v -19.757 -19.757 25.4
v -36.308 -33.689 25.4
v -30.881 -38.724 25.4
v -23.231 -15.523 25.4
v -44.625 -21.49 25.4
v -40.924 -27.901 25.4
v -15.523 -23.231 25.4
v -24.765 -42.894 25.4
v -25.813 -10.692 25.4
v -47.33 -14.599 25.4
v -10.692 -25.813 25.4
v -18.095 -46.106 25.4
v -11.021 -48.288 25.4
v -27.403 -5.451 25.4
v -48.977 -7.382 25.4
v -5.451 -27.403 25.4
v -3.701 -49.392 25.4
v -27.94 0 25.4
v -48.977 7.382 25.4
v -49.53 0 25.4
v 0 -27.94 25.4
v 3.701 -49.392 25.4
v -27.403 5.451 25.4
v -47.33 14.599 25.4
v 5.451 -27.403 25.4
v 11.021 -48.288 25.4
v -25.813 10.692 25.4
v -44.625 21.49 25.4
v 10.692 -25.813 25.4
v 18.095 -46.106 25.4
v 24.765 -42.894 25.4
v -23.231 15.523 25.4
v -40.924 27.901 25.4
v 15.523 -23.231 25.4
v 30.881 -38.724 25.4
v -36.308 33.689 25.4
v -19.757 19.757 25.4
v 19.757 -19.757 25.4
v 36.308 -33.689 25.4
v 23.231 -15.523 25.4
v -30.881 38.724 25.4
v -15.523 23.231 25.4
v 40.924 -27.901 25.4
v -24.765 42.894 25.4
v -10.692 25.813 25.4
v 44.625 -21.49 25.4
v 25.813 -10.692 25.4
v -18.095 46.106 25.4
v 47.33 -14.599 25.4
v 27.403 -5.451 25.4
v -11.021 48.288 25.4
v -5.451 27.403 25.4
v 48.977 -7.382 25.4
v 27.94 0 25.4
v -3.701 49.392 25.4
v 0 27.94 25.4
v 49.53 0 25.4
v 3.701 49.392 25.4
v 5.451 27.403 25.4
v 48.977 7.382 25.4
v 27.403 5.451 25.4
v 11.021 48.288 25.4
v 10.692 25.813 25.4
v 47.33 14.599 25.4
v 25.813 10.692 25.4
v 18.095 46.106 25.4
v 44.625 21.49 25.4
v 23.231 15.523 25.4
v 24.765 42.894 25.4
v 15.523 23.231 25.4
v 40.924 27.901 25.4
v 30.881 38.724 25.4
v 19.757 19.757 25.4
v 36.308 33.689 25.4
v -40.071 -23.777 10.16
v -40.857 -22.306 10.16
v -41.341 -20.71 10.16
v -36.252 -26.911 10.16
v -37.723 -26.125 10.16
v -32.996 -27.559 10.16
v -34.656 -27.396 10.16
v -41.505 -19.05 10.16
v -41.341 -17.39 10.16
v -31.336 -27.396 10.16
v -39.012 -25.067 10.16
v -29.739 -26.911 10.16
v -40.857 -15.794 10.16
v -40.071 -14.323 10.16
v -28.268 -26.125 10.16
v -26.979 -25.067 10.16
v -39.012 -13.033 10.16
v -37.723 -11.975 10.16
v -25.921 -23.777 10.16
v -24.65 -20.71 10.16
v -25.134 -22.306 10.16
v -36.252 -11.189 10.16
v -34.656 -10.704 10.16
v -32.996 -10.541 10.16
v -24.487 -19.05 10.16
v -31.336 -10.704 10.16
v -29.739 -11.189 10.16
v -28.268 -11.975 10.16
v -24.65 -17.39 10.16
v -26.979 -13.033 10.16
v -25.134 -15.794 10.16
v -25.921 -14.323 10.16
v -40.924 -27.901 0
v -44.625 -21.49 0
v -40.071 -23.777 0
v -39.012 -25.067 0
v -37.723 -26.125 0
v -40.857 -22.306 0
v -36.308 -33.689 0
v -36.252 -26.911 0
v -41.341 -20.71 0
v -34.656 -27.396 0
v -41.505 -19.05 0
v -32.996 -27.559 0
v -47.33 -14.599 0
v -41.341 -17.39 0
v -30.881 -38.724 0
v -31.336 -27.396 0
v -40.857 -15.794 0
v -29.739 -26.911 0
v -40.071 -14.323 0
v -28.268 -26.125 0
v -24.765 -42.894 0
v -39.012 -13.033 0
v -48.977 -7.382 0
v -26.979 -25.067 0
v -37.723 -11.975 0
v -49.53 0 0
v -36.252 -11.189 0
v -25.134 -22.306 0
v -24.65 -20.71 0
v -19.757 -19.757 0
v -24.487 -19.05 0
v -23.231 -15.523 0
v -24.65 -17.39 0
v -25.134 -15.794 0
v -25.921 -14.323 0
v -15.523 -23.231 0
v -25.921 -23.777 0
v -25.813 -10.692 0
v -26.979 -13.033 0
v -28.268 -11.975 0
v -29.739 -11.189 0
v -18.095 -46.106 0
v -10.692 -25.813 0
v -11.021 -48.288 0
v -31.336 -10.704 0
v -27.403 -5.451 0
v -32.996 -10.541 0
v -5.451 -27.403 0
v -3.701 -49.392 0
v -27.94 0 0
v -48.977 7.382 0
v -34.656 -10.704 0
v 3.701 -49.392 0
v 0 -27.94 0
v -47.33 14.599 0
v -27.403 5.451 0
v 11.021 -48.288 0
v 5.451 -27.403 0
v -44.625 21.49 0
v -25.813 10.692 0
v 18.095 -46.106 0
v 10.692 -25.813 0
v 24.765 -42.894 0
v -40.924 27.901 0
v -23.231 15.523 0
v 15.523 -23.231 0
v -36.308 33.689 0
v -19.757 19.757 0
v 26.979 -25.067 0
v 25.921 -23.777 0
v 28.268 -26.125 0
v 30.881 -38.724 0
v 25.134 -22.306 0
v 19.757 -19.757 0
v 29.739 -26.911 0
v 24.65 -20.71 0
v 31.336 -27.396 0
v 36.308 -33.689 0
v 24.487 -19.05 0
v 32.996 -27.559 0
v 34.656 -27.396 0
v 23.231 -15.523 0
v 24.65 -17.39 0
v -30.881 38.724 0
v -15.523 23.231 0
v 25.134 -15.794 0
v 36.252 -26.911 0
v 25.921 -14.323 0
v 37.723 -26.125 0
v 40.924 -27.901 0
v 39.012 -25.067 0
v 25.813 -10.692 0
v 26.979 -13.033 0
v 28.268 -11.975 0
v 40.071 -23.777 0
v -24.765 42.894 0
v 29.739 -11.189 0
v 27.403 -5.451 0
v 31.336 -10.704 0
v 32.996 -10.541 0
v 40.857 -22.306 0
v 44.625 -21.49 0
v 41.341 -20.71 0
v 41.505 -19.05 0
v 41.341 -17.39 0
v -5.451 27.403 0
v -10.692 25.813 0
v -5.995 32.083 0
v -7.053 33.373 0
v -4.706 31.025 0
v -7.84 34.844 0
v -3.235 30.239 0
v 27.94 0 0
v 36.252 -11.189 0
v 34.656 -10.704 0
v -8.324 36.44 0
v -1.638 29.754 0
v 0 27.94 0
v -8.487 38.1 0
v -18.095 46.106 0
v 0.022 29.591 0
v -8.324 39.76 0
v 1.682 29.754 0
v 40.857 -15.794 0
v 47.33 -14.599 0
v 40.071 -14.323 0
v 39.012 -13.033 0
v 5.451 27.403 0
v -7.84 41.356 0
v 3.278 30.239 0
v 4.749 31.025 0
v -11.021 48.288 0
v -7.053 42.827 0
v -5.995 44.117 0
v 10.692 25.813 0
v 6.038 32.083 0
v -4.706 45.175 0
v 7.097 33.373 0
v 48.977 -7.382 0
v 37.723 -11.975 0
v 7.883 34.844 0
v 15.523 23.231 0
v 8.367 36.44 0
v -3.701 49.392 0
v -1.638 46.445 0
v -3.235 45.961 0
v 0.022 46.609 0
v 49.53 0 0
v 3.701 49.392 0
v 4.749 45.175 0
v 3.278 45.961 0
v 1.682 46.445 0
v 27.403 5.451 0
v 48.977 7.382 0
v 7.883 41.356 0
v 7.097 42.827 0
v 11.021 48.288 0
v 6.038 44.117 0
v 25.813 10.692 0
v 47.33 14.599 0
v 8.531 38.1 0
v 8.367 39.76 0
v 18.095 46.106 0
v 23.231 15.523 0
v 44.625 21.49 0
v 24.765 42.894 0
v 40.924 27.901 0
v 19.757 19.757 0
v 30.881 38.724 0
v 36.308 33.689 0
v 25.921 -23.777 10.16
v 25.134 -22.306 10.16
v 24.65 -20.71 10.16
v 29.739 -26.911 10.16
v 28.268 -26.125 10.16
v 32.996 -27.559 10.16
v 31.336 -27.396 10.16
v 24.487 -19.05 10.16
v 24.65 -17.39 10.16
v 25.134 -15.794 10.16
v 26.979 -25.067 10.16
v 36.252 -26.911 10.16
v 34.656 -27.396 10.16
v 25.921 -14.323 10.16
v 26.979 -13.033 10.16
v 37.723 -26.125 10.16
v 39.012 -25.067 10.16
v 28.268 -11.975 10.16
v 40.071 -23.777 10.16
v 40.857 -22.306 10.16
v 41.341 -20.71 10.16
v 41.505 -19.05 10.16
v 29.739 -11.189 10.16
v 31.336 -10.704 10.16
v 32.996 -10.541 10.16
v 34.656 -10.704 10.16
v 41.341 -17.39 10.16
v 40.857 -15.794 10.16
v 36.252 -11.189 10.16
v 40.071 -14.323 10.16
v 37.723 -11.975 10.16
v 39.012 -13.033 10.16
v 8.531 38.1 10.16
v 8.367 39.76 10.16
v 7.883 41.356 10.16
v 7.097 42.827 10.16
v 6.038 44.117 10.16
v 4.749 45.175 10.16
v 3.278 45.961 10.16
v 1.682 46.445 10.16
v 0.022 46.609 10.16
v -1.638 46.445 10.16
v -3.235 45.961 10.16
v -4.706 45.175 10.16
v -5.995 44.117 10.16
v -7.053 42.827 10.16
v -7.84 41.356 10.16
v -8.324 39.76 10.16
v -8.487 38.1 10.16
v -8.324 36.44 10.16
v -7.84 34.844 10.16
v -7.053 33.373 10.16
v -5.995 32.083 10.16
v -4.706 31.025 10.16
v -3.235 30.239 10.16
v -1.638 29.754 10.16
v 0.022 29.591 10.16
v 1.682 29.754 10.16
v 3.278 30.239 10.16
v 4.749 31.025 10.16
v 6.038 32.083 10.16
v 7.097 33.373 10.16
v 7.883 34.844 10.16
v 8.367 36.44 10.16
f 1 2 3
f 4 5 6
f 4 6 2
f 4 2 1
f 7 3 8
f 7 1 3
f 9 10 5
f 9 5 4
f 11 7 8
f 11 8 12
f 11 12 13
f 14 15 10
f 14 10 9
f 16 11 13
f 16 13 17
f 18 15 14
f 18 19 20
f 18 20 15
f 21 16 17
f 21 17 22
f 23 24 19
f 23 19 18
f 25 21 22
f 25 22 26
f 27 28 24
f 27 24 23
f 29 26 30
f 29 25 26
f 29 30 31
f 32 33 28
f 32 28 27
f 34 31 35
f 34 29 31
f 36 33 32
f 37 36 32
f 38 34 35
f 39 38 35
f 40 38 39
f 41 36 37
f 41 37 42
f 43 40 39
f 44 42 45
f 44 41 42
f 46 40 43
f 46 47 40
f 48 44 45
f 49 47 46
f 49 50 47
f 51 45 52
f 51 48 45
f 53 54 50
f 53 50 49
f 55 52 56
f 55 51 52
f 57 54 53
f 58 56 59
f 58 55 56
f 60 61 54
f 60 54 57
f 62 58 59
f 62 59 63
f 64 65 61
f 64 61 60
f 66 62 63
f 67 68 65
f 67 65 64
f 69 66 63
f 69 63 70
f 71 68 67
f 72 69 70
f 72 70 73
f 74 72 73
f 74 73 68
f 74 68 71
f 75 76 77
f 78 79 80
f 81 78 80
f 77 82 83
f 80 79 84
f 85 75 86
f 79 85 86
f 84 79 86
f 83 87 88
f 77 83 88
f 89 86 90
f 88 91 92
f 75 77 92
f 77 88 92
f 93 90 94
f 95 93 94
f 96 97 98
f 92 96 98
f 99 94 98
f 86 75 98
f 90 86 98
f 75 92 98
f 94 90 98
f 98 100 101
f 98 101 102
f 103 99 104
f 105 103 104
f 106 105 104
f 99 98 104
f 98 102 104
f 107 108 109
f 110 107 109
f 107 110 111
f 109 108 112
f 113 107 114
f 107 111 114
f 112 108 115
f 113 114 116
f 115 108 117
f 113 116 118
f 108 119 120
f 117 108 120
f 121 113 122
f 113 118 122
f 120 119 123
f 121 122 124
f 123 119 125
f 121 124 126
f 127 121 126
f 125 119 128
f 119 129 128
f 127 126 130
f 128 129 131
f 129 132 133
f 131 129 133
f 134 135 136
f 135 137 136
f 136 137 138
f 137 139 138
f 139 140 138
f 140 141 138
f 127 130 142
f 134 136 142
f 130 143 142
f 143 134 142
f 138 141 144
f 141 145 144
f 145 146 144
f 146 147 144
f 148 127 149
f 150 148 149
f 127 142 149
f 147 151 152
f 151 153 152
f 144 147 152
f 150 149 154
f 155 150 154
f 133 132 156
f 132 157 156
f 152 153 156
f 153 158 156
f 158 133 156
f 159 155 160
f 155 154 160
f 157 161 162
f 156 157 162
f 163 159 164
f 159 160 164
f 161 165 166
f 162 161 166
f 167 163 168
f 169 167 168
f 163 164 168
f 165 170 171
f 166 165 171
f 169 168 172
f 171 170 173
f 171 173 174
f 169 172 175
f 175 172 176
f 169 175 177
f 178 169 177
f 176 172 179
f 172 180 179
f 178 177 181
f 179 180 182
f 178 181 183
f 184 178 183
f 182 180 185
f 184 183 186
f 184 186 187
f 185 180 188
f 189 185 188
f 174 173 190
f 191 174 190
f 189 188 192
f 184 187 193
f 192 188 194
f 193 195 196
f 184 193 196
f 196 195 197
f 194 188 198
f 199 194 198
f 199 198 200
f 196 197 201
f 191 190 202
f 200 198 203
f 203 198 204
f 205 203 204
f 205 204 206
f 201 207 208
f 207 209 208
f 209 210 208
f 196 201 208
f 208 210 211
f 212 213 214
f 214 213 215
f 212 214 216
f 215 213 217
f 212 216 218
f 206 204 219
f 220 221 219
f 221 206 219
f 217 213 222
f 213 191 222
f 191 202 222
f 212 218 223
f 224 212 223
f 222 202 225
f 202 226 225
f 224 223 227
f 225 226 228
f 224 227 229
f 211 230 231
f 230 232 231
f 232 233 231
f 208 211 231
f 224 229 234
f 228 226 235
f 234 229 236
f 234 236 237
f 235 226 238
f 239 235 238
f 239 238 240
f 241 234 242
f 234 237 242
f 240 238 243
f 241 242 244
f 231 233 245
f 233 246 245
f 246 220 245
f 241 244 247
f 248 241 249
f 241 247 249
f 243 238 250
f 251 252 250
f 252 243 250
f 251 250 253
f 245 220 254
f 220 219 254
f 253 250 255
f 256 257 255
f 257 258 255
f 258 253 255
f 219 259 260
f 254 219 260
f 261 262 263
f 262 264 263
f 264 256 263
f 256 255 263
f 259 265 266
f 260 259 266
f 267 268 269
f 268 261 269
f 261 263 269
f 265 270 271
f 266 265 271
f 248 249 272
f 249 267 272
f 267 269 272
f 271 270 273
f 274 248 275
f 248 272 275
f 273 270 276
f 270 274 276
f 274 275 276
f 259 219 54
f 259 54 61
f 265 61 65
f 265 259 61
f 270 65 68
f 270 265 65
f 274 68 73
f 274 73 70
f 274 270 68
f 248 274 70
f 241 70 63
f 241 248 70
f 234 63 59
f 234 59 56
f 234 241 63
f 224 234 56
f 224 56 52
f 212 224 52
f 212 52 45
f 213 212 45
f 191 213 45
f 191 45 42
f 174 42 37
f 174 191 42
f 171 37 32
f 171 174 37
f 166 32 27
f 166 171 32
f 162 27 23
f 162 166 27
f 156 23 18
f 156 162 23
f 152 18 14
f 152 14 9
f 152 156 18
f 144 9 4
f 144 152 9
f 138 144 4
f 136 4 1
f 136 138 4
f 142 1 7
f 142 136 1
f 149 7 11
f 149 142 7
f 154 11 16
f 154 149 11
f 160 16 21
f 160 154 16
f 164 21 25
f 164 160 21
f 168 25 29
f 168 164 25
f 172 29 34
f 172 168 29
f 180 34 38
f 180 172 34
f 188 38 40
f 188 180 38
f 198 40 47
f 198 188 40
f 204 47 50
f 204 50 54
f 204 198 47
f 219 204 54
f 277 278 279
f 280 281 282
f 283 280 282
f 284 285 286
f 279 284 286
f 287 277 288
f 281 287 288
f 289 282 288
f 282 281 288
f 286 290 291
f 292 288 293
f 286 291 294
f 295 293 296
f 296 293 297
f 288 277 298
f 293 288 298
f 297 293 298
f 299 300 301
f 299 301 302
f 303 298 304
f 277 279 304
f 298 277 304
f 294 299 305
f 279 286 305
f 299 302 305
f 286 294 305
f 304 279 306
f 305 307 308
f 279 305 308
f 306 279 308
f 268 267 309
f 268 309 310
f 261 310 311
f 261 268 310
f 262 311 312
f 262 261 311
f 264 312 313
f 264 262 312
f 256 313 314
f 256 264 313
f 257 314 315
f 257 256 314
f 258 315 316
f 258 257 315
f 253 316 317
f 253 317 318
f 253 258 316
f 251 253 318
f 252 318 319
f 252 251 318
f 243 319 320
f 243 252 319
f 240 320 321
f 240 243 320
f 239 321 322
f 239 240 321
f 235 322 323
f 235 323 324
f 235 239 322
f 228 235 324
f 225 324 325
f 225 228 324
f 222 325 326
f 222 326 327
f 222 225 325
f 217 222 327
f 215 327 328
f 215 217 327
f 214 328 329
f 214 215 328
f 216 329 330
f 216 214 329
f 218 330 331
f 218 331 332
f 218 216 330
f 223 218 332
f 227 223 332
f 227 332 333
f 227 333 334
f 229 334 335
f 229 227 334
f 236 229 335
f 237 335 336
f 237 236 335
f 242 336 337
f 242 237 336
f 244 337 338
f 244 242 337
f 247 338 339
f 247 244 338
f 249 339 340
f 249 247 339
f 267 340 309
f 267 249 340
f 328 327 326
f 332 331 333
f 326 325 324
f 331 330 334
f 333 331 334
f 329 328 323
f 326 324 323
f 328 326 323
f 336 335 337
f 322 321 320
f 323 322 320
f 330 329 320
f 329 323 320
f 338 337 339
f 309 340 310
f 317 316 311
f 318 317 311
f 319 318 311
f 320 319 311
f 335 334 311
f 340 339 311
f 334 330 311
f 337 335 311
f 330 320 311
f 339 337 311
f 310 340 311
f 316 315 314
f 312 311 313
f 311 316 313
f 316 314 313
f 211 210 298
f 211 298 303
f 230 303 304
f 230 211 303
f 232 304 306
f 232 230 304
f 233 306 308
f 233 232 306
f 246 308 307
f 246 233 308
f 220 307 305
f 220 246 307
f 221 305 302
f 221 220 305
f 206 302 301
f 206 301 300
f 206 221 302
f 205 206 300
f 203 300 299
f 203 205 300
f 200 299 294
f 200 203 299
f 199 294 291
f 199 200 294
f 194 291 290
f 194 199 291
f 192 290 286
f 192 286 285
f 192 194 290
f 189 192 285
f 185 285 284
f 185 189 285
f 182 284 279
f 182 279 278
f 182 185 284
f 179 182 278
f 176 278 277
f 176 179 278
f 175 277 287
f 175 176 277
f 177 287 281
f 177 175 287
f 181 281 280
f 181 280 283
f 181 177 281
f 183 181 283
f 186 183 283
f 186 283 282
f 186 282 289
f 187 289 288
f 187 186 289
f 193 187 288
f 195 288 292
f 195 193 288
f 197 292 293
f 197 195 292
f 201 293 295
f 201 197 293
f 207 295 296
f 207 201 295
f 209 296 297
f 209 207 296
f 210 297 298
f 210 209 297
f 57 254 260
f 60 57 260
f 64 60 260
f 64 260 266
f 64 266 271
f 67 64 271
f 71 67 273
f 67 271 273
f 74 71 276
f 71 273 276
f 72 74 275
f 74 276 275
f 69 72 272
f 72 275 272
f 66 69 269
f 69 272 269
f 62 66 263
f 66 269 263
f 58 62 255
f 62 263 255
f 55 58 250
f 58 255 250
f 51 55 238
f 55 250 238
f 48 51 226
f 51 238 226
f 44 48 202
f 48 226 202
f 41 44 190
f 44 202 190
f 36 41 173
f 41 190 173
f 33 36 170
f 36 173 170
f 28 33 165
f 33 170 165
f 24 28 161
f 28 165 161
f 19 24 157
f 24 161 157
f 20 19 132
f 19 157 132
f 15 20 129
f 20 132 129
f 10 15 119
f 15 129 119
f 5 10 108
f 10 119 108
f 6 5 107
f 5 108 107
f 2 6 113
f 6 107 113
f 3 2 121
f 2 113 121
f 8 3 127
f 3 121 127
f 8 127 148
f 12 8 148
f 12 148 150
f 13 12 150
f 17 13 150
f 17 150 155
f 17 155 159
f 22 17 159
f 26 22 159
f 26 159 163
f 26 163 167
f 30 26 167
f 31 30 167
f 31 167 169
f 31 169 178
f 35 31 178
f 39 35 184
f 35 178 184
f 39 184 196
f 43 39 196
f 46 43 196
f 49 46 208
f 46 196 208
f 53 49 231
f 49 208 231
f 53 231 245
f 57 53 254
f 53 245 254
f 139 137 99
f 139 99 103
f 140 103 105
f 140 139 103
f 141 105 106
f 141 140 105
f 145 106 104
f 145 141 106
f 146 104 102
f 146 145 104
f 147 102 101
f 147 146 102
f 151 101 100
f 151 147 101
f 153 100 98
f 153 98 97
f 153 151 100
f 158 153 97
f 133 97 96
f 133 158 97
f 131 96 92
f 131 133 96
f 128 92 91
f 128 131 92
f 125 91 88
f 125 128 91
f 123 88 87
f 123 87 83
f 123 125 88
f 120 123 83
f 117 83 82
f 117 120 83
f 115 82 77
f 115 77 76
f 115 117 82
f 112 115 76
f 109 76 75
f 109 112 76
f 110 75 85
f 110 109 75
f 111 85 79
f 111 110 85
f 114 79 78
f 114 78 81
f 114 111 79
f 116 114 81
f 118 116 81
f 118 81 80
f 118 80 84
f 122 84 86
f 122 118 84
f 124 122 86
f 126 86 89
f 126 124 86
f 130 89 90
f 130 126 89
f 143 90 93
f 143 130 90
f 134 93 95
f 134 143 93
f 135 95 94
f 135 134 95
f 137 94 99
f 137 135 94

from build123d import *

# Parameters (mm, degrees)
F0_R        = 49.53
F0_R_2      = 8.509
F0_R_3      = 27.94
F1_DEPTH    = 25.4
F1_FACE_R   = 49.53
F1_FACE_R_2 = 27.94
F2_DEPTH    = 10.16


with BuildPart() as f1:
    # F0 (on Top) → F1 (new body)
    with BuildSketch(Plane.XY):
        Circle(F0_R)
        with Locations((-32.9955678842, -19.05)):
            Circle(F0_R_2, mode=Mode.SUBTRACT)
        Circle(F0_R_3, mode=Mode.SUBTRACT)
        with Locations((32.9955678842, -19.05)):
            Circle(F0_R_2, mode=Mode.SUBTRACT)
        with Locations((0.0215684675, 38.0999937206)):
            Circle(F0_R_2, mode=Mode.SUBTRACT)
        with Locations((0.0215684675, 38.0999937206)):
            Circle(F0_R_2)
        with Locations((-32.9955678842, -19.05)):
            Circle(F0_R_2)
        with Locations((32.9955678842, -19.05)):
            Circle(F0_R_2)
    extrude(amount=F1_DEPTH)

    # F1_face (on face) + F0 (on Top) → F2 (cut)
    with BuildSketch(Plane.XY.offset(25.4)):
        Circle(F1_FACE_R)
        Circle(F1_FACE_R_2, mode=Mode.SUBTRACT)
    with BuildSketch(Plane.XY):
        with Locations((0.0215684675, 38.0999937206)):
            Circle(F0_R_2)
        with Locations((-32.9955678842, -19.05)):
            Circle(F0_R_2)
        with Locations((32.9955678842, -19.05)):
            Circle(F0_R_2)
    extrude(amount=F2_DEPTH, mode=Mode.SUBTRACT)


solid = f1.part
